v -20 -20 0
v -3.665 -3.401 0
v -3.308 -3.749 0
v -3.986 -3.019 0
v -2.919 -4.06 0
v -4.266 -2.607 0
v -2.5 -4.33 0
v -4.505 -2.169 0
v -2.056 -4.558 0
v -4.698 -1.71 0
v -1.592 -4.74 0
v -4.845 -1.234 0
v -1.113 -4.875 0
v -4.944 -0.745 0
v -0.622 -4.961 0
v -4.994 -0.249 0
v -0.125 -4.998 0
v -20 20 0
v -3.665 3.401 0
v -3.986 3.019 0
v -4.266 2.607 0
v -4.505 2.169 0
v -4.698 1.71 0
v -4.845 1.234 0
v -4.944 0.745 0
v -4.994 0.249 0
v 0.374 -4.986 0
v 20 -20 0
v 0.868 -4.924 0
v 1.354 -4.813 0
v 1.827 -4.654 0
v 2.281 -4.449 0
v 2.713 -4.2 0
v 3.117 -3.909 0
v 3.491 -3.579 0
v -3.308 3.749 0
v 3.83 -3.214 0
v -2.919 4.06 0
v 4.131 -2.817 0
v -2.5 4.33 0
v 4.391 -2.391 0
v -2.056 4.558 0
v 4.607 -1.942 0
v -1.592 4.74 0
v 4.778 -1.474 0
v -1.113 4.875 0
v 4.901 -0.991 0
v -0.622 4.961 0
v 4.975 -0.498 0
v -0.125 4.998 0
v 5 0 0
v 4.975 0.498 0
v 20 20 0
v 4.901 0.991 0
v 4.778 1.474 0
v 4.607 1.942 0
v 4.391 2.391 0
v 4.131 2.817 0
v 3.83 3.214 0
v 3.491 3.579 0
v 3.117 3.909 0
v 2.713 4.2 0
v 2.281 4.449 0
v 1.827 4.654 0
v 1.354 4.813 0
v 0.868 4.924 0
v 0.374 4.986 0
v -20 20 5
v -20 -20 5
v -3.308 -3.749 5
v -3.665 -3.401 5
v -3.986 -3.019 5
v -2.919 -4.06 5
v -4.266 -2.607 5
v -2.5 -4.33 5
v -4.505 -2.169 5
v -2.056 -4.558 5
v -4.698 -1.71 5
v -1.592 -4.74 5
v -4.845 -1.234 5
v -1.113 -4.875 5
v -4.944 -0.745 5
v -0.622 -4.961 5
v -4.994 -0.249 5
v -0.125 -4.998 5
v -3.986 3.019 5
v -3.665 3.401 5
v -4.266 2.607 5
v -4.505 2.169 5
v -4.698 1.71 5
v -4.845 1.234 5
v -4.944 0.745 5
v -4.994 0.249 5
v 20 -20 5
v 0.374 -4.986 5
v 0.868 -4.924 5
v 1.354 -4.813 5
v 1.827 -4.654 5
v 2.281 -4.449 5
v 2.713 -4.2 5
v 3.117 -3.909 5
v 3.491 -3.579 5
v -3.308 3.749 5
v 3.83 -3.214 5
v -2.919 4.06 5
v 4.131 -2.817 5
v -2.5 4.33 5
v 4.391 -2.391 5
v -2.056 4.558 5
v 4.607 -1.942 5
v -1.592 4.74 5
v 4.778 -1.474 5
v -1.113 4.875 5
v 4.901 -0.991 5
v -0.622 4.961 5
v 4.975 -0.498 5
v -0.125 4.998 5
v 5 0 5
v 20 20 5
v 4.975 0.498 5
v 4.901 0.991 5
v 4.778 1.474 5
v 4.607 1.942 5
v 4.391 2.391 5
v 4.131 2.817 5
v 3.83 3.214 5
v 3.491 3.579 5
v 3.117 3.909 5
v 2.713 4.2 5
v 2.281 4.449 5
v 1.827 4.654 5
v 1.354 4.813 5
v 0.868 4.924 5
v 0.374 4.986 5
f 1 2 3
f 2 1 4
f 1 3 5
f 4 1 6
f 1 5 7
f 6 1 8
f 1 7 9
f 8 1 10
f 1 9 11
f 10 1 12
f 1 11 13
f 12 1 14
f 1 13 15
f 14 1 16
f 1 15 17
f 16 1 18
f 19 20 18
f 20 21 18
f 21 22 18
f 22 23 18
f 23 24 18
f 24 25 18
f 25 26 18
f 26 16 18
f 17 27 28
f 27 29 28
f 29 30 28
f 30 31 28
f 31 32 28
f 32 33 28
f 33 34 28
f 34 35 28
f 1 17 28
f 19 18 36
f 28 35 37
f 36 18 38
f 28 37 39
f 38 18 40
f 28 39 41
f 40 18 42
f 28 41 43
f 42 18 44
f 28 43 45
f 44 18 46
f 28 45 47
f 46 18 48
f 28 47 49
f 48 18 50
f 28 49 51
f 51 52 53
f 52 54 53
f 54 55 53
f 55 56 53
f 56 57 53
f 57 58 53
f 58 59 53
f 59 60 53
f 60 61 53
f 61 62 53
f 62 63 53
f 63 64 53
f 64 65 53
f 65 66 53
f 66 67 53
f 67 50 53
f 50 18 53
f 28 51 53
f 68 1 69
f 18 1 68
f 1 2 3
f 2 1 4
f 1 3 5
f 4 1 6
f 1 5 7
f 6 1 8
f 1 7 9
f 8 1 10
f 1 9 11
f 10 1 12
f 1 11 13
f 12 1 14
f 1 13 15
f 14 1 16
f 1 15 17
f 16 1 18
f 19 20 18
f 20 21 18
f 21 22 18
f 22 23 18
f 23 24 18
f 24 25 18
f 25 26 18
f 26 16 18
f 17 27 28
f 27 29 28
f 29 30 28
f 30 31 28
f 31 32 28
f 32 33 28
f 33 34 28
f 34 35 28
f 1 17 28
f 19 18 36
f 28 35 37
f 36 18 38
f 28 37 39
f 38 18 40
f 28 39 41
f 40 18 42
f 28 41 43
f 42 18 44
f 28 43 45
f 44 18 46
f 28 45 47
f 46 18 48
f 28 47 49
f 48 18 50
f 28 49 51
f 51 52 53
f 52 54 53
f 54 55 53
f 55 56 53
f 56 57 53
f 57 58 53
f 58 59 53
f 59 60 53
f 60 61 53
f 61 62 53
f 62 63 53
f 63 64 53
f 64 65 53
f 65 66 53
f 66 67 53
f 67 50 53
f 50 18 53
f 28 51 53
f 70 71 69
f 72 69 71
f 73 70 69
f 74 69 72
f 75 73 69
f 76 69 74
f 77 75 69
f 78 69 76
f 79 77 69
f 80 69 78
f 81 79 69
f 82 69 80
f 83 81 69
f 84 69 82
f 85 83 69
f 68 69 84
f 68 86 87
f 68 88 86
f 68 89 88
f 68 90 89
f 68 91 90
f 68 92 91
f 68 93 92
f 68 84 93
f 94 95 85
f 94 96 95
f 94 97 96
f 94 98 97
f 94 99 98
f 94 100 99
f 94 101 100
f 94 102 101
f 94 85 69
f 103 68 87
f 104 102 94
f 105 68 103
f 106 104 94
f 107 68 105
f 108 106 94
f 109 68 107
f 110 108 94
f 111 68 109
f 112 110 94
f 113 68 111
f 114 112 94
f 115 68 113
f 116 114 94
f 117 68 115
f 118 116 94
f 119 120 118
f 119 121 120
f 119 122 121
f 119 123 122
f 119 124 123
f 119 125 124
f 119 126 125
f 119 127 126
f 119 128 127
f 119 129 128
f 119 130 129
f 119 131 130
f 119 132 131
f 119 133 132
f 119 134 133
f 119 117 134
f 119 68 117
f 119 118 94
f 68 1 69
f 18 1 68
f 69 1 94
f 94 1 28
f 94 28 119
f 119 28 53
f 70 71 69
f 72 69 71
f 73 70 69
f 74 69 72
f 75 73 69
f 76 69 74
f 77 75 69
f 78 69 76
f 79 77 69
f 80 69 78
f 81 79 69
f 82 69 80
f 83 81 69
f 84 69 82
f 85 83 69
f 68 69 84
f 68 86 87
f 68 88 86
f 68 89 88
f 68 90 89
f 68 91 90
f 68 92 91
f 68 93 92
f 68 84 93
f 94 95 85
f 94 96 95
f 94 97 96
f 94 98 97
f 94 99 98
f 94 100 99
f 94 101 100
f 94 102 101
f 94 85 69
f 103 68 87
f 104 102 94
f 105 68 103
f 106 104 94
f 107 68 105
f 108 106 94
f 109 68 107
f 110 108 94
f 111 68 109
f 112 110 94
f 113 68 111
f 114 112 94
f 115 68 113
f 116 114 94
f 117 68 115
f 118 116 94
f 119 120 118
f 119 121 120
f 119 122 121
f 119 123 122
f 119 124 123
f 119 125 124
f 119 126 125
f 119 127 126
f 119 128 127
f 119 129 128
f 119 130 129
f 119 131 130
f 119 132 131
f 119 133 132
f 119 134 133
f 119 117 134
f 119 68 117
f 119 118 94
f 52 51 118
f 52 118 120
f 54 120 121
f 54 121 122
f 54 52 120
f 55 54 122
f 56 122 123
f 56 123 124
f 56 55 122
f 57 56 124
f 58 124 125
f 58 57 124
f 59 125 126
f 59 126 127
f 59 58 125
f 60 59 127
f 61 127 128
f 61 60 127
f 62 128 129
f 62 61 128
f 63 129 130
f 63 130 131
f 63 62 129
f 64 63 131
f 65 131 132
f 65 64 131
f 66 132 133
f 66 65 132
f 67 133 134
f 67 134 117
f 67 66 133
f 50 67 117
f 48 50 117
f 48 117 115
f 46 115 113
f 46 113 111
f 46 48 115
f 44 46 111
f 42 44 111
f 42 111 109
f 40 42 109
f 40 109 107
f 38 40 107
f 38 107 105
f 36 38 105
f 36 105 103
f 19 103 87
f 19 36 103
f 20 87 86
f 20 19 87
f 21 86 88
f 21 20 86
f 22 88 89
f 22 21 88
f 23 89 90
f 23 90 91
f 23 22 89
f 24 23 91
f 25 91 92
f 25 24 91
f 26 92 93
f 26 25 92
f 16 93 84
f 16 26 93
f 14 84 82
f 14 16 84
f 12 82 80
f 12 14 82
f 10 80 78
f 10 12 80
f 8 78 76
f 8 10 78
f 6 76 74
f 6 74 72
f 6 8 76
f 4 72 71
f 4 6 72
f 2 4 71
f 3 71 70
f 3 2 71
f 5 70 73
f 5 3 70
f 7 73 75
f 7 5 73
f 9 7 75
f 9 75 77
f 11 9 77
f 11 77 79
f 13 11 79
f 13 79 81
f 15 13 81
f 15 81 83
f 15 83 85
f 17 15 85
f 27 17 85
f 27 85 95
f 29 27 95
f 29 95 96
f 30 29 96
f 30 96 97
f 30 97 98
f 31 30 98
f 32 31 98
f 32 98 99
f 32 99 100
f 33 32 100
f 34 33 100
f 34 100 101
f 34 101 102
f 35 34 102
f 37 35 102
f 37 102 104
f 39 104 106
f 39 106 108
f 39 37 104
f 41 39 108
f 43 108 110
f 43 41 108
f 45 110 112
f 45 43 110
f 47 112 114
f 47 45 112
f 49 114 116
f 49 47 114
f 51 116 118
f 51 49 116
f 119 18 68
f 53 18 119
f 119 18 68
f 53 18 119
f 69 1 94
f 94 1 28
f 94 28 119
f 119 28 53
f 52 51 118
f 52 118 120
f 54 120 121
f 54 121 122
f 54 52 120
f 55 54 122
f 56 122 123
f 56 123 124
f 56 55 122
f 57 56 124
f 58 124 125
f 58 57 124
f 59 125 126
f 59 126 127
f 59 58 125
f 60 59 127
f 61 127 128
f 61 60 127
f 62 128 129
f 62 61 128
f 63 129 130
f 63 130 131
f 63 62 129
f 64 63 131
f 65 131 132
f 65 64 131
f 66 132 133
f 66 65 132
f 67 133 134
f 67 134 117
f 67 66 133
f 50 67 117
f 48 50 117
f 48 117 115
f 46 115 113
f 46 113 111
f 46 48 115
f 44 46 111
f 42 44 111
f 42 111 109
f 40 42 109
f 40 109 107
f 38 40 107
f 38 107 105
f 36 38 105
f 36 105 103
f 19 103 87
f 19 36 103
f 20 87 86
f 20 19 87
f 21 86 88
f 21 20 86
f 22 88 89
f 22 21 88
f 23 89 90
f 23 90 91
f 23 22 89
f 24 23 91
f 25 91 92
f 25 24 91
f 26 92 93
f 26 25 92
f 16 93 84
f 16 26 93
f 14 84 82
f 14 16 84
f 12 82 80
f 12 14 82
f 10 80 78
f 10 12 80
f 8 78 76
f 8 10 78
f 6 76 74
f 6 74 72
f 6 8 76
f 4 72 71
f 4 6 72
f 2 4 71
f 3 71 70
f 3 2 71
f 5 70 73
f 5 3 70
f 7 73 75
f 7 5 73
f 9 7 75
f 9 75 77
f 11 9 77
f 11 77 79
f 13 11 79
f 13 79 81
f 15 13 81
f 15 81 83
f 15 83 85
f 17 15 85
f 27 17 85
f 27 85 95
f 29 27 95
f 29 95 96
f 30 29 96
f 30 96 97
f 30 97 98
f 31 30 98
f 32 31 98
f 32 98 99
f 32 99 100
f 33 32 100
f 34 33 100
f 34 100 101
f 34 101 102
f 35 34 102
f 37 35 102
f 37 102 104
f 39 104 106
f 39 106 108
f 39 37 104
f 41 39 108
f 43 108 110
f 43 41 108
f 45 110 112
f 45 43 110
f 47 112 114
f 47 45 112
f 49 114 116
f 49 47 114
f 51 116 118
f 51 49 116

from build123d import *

# Parameters (mm, degrees)
SKETCH_W         = 40
SKETCH_H         = 40
SKETCH_R         = 5
EXTRUDE_DEPTH    = 5
EXTRUDE001_DEPTH = 5


with BuildPart() as extrude_body:
    # Sketch → Extrude (new body)
    with BuildSketch(Plane.XY):
        Rectangle(SKETCH_W, SKETCH_H)
        Circle(SKETCH_R, mode=Mode.SUBTRACT)
    extrude(amount=EXTRUDE_DEPTH)


with BuildPart() as extrude001:
    # Sketch → Extrude001 (new body)
    with BuildSketch(Plane.XY):
        Rectangle(SKETCH_W, SKETCH_H)
        Circle(SKETCH_R, mode=Mode.SUBTRACT)
    extrude(amount=EXTRUDE001_DEPTH)


solid = Compound([extrude_body.part, extrude001.part])
